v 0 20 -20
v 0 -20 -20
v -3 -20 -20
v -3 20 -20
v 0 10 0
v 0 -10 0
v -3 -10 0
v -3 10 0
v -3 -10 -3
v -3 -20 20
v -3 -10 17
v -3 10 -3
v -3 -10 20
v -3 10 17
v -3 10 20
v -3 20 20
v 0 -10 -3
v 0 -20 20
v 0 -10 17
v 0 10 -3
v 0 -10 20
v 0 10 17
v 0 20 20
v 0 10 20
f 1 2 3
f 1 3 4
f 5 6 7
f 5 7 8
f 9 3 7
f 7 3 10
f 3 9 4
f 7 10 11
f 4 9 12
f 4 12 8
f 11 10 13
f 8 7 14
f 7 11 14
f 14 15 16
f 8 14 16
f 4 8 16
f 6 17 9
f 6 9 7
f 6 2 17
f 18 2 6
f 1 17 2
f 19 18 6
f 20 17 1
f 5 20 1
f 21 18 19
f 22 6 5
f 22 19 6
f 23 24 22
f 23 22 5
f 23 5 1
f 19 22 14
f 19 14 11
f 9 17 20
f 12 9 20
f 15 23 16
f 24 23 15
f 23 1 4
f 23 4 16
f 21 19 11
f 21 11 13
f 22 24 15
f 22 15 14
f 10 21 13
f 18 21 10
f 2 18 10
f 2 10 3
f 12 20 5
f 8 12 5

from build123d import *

# Parameters (mm, degrees)
F1_W     = 20
F1_H     = 3
F2_DEPTH = 3


with BuildPart() as f2:
    # F1 (on Right) → F2 (new body)
    with BuildSketch(Plane.YZ):
        Polygon((-20, -20), (20, -20), (20, 20), (10, 20), (10, 17), (-10, 17), (-10, 20), (-20, 20), align=None)
        with Locations((0, -1.5)):
            Rectangle(F1_W, F1_H, mode=Mode.SUBTRACT)
    extrude(amount=-F2_DEPTH)


solid = f2.part
